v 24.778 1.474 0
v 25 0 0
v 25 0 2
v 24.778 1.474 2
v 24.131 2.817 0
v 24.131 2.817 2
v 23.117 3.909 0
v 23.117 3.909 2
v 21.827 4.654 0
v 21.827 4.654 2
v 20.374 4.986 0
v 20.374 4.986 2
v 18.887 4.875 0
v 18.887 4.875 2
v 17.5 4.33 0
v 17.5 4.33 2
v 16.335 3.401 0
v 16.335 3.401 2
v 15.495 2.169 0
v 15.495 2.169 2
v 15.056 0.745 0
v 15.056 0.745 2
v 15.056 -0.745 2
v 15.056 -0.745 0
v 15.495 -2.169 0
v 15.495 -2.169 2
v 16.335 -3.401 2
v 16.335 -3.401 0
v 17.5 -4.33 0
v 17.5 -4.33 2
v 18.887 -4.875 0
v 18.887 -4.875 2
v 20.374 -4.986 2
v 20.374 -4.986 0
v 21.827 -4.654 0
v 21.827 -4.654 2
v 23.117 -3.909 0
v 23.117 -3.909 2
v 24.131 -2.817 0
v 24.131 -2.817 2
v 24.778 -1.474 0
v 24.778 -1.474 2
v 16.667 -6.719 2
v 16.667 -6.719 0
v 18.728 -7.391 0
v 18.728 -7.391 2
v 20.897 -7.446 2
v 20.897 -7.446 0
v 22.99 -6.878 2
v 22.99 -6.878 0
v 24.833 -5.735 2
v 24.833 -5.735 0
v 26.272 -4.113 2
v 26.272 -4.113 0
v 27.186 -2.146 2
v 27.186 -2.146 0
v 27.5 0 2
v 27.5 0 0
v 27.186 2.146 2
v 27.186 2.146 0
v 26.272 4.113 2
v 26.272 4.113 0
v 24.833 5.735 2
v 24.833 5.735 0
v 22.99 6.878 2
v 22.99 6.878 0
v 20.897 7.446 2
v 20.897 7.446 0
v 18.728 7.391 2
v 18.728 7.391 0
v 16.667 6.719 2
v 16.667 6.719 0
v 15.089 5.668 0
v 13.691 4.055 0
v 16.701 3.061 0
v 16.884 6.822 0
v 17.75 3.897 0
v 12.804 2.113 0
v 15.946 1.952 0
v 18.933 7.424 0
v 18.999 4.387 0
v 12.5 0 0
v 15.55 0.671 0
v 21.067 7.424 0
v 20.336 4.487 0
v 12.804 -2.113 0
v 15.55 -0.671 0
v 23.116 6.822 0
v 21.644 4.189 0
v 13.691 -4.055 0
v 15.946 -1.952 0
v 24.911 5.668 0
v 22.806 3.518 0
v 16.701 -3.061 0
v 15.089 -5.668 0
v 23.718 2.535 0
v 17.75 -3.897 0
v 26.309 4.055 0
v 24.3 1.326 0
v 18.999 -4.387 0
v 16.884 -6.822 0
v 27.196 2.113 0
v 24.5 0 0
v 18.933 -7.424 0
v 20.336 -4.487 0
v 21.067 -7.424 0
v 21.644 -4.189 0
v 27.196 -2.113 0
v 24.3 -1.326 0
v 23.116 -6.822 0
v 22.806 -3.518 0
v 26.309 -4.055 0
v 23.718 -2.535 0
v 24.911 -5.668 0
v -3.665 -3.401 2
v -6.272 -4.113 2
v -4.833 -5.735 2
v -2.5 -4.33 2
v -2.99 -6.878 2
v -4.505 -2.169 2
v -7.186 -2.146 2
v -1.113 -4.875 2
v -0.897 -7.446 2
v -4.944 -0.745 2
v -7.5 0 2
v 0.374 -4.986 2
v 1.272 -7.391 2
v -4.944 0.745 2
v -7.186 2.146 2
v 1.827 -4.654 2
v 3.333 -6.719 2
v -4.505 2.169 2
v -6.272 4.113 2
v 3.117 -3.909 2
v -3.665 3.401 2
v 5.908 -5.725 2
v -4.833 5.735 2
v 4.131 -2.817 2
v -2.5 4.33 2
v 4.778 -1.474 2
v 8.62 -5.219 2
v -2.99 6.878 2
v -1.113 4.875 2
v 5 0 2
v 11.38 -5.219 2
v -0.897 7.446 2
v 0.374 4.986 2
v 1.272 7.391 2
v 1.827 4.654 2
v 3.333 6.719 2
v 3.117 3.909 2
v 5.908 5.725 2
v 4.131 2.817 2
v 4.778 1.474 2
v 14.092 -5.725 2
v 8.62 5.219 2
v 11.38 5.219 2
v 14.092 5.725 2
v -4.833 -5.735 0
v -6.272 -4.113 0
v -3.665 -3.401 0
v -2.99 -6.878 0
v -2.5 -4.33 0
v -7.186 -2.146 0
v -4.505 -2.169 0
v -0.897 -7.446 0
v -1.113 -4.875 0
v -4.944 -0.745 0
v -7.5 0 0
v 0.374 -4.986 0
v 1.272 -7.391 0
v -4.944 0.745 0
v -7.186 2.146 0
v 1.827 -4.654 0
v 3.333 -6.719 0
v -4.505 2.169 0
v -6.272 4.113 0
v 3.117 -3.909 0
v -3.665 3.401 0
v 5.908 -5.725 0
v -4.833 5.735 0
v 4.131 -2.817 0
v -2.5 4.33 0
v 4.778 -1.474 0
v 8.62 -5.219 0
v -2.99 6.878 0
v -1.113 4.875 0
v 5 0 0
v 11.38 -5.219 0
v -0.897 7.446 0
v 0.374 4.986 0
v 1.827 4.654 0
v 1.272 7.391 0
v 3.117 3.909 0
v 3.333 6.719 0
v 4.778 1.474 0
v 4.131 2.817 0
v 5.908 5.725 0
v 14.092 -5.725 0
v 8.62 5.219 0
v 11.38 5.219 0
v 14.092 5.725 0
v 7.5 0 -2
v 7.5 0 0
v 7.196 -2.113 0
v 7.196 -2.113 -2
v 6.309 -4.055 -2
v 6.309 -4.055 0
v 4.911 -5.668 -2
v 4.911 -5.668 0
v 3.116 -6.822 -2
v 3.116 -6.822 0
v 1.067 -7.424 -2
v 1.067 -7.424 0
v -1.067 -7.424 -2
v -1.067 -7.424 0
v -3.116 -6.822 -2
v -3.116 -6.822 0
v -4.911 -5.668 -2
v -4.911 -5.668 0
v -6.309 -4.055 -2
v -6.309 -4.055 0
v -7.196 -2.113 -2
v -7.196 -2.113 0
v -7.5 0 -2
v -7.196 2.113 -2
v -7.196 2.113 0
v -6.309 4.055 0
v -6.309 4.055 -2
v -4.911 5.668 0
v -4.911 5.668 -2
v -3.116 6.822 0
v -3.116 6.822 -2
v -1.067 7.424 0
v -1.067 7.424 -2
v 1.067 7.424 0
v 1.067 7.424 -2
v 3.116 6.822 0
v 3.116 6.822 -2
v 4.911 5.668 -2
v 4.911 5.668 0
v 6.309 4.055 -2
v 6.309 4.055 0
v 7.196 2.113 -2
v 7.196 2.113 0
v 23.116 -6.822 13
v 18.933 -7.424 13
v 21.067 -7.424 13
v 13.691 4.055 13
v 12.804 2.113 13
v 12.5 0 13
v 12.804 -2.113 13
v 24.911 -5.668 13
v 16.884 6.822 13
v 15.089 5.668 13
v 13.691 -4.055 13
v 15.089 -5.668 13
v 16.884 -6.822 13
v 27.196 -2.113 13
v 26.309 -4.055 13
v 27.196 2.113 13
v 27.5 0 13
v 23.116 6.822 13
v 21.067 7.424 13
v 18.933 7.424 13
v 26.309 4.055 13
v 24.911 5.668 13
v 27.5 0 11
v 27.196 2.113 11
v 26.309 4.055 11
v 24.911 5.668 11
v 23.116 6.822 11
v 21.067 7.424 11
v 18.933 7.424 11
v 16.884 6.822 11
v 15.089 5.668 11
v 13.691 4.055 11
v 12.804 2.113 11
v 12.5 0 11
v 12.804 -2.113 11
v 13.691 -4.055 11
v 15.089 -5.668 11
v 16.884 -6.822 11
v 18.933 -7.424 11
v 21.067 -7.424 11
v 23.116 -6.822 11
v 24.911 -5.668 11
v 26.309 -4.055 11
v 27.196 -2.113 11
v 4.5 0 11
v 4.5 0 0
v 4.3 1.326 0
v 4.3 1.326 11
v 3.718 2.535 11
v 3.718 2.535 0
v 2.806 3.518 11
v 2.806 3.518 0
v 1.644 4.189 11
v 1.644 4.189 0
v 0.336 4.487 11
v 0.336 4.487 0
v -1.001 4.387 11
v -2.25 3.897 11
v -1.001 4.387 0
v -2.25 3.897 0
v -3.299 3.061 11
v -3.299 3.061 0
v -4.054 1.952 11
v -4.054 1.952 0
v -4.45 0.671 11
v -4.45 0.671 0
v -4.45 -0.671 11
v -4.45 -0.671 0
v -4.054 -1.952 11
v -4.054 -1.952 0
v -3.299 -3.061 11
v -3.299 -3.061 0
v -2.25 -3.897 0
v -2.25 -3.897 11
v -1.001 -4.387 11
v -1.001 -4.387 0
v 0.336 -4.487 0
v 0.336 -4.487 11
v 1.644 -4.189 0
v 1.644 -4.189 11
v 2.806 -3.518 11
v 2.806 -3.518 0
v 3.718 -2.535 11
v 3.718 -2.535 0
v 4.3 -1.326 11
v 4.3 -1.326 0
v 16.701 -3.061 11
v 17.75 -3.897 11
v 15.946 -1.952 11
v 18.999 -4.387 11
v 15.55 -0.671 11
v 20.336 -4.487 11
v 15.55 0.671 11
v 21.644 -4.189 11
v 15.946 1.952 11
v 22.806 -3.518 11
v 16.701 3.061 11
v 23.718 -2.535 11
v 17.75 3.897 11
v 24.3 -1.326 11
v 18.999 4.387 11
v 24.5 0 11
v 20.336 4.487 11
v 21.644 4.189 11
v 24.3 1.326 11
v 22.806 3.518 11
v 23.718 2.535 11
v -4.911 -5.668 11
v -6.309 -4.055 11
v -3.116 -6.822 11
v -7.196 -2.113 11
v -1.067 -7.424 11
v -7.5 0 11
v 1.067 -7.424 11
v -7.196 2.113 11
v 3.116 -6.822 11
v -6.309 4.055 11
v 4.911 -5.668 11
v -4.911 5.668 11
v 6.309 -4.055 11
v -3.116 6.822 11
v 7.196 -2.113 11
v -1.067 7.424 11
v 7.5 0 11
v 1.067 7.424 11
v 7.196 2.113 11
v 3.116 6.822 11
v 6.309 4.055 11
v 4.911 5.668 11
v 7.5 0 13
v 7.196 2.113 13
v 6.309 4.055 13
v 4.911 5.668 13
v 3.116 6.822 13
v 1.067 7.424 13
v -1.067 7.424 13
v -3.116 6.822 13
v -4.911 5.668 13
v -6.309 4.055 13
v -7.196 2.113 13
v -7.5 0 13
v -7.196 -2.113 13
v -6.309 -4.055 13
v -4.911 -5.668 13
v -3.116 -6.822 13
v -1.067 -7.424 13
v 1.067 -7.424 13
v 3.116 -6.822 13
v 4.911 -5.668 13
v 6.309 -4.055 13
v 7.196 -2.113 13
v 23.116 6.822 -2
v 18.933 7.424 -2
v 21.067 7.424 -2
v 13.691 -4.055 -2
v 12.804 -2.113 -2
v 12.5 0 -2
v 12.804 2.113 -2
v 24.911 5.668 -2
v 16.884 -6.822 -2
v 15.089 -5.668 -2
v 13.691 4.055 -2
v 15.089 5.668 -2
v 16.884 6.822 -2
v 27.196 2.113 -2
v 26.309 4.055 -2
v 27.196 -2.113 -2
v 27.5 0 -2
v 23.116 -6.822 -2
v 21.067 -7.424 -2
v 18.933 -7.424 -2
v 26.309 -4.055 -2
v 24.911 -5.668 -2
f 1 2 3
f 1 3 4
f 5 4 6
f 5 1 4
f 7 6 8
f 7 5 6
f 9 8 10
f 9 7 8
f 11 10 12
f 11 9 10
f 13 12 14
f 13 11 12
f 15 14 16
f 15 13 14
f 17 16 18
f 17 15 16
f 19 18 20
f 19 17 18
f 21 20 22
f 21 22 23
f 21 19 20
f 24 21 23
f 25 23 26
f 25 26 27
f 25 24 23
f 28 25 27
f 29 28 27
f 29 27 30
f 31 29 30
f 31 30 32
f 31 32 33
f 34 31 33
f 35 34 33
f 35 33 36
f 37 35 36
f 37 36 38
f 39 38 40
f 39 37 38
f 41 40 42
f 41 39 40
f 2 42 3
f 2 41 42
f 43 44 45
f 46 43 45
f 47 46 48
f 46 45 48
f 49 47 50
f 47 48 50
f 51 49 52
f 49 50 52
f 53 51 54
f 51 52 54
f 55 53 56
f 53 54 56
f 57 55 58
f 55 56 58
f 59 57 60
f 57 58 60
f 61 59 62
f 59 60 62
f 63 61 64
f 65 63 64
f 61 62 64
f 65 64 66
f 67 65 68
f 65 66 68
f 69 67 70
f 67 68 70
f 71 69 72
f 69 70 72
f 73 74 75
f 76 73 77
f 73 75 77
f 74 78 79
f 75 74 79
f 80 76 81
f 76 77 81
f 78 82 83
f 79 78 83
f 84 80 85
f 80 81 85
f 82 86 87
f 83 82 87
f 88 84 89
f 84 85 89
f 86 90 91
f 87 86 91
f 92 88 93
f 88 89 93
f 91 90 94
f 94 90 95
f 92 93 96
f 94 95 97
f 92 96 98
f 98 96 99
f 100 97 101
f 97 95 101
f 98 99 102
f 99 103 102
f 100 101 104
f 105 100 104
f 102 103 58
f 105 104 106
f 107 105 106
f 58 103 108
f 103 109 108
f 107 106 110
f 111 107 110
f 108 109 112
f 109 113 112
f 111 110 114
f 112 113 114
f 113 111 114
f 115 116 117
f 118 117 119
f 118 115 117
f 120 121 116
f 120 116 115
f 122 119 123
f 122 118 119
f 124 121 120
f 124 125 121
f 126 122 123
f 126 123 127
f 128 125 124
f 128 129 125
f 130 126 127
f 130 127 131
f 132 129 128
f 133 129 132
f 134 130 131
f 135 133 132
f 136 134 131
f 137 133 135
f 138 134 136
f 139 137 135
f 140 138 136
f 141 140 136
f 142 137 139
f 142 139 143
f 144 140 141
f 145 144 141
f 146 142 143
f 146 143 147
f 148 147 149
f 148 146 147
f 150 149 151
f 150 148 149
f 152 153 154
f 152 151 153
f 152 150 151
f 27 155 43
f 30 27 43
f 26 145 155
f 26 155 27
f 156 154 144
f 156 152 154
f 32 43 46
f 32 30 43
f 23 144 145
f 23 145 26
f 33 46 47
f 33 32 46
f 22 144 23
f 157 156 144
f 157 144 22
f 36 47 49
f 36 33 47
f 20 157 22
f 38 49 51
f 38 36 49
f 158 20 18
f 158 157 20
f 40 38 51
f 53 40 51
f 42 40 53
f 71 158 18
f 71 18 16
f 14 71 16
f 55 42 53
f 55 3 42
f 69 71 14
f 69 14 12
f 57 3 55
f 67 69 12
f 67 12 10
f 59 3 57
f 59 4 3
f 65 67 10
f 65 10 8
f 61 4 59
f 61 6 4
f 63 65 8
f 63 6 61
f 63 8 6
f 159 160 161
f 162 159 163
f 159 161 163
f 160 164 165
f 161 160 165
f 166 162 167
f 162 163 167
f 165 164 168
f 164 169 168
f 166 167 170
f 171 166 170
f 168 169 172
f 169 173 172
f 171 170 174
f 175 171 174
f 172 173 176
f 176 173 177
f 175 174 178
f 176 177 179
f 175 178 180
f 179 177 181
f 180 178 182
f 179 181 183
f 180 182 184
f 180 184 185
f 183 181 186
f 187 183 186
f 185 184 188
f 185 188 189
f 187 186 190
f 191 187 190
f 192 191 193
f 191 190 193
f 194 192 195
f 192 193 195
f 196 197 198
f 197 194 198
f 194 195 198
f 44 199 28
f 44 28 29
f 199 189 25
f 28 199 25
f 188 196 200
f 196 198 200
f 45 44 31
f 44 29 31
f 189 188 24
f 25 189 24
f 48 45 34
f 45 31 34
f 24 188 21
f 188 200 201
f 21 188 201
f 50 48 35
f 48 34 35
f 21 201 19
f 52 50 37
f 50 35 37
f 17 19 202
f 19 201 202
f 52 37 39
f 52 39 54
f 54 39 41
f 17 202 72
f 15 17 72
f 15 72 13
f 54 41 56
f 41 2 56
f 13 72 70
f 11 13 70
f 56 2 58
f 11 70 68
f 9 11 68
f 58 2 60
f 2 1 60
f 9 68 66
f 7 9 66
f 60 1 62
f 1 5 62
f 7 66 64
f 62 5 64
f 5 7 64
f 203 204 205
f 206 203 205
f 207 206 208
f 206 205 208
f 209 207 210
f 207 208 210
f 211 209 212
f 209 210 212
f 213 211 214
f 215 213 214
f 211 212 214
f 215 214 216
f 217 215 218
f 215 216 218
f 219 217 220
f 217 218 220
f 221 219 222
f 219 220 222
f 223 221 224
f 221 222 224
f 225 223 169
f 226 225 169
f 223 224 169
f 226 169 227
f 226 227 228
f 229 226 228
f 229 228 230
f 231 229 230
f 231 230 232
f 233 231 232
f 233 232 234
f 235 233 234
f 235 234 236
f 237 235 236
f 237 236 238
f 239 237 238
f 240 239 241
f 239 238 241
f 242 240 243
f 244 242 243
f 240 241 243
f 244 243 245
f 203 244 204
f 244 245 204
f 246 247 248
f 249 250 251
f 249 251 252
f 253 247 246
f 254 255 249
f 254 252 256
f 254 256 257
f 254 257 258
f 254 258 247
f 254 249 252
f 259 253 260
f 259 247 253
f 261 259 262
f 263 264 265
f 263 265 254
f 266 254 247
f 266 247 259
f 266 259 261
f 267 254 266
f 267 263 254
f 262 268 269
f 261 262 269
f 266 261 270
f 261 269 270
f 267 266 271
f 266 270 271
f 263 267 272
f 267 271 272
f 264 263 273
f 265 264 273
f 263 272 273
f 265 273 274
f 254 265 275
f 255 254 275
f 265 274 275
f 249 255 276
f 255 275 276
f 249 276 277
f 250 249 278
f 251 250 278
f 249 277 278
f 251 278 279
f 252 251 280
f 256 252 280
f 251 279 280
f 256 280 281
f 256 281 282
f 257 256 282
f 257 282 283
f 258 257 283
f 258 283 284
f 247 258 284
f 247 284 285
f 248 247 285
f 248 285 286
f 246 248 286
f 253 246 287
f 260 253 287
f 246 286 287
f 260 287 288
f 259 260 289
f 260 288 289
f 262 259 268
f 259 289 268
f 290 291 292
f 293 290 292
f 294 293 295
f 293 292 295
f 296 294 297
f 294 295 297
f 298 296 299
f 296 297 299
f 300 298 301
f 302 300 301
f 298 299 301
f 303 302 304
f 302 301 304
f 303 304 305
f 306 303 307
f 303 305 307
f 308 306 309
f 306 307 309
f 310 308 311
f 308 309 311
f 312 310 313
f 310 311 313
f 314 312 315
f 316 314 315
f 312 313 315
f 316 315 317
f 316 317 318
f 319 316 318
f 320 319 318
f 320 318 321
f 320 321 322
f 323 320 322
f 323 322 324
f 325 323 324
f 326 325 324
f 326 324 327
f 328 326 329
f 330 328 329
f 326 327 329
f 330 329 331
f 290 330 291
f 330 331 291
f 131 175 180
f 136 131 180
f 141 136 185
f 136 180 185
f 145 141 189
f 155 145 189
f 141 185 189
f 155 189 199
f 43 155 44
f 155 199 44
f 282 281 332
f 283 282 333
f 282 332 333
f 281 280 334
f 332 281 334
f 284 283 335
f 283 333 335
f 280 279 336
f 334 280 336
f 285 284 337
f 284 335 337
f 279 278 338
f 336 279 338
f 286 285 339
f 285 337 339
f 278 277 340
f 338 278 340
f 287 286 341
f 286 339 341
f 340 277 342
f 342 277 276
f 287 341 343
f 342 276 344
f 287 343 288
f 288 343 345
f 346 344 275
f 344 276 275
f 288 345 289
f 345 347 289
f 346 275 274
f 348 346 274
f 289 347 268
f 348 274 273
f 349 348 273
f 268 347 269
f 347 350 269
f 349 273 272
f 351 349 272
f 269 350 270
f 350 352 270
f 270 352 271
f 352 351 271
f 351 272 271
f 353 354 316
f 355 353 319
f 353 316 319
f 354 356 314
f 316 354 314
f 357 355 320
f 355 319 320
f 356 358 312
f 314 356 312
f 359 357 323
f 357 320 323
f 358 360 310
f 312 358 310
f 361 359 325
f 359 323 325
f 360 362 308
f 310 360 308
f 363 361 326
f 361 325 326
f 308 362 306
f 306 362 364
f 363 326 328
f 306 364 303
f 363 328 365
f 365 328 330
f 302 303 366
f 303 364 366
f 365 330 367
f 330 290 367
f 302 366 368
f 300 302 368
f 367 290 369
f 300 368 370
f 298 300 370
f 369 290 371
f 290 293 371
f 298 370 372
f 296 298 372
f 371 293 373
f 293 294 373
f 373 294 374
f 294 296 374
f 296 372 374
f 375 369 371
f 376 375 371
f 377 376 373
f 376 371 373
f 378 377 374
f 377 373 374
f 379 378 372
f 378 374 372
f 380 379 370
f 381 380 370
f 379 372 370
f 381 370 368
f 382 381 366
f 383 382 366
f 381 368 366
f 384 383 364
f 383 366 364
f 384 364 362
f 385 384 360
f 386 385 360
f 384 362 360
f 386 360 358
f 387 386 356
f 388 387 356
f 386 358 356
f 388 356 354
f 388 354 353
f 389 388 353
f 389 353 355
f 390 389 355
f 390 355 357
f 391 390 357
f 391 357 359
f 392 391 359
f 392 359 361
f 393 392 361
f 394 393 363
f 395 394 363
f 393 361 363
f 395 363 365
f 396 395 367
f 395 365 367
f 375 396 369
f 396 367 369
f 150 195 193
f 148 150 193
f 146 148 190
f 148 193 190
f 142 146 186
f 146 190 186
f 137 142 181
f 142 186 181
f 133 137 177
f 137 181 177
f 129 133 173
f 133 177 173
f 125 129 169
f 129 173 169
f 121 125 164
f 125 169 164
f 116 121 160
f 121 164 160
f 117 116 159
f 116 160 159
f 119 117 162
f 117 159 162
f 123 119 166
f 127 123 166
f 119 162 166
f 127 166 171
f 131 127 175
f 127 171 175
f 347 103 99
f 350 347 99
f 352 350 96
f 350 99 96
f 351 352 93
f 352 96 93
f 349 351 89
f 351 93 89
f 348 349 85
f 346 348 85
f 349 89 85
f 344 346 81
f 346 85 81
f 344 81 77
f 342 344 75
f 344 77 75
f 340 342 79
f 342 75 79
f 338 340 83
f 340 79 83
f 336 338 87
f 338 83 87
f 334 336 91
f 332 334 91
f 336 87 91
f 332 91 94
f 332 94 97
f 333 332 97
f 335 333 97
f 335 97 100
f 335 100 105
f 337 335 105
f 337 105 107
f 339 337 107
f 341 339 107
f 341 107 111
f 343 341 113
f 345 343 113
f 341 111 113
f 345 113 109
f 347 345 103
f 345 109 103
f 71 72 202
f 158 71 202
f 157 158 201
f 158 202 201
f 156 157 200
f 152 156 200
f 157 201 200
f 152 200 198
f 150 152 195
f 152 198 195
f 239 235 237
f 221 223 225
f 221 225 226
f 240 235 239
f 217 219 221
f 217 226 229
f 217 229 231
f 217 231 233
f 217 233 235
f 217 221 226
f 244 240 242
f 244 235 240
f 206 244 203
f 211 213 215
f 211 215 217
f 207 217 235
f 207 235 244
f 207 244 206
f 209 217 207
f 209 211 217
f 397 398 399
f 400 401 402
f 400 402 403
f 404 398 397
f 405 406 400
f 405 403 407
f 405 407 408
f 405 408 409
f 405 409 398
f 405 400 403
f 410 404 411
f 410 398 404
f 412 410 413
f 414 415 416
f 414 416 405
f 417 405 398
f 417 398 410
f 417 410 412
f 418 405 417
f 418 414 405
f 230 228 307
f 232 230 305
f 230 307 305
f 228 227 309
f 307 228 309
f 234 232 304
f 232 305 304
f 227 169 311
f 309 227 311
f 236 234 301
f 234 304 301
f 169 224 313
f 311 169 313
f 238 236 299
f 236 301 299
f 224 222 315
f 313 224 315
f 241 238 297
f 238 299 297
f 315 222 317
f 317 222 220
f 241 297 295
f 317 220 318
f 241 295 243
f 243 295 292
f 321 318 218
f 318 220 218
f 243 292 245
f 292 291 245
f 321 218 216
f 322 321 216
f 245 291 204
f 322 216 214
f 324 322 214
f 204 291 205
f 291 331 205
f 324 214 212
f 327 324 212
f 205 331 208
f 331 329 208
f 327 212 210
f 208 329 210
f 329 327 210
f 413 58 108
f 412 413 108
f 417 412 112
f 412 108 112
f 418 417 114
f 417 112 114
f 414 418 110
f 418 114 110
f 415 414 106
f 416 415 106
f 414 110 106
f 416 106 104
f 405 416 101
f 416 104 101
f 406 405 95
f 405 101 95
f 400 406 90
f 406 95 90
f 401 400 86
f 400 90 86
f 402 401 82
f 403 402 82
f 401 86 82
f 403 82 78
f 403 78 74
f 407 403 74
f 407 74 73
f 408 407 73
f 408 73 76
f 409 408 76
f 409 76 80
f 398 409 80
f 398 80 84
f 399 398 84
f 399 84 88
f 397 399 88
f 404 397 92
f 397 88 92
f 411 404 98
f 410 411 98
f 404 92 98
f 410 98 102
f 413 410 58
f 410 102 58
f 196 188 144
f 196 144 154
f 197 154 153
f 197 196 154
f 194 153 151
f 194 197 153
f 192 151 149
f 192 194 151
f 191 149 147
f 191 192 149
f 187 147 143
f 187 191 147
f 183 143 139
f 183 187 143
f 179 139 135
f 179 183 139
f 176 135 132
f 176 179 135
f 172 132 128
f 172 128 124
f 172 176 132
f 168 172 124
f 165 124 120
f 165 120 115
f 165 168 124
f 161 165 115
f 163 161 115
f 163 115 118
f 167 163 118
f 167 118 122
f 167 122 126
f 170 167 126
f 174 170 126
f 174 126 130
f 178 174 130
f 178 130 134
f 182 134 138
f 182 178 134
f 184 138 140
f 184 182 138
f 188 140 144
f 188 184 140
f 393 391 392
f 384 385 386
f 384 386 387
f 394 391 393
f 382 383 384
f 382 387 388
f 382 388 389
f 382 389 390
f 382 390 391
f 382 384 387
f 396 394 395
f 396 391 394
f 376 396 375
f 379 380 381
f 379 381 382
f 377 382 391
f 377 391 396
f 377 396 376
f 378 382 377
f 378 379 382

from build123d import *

# Parameters (mm, degrees)
F0_R     = 5
F1_DEPTH = 2
F2_R     = 4.5
F3_DEPTH = 11
F4_R     = 7.5
F5_DEPTH = 2
F6_R     = 7.5
F7_DEPTH = 2


with BuildPart() as f1:
    # F0 (on Top) → F1 (new body)
    with BuildSketch(Plane.XY):
        with BuildLine():
            ThreePointArc((16.6666666667, 6.7185481236), (10, 5.1556443707), (3.3333333333, 6.7185481236))
            ThreePointArc((3.3333333333, 6.7185481236), (-7.5, 0), (3.3333333333, -6.7185481236))
            ThreePointArc((3.3333333333, -6.7185481236), (10, -5.1556443707), (16.6666666667, -6.7185481236))
            ThreePointArc((16.6666666667, -6.7185481236), (27.5, 0), (16.6666666667, 6.7185481236))
        make_face()
        Circle(F0_R, mode=Mode.SUBTRACT)
        with Locations((20, 0)):
            Circle(F0_R, mode=Mode.SUBTRACT)
    extrude(amount=F1_DEPTH)


with BuildPart() as f3:
    # F2 (on Top) → F3 (new body)
    with BuildSketch(Plane.XY):
        Circle(F2_R)
    extrude(amount=F3_DEPTH)

    # F4 (on face) → F5 (join)
    with BuildSketch(Plane.XY.offset(11)):
        Circle(F4_R)
    extrude(amount=F5_DEPTH)

    # F6 (on face) → F7 (join)
    with BuildSketch(Plane(origin=(0, 0, 0), x_dir=(1, 0, 0), z_dir=(0, 0, -1))):
        Circle(F6_R)
    extrude(amount=F7_DEPTH)


with BuildPart() as f3b:
    # F2 (on Top) → F3, piece 2 (new body)
    with BuildSketch(Plane.XY):
        with Locations((20, 0)):
            Circle(F2_R)
    extrude(amount=F3_DEPTH)

    # F4 (on face) → F5, piece 2 (join)
    with BuildSketch(Plane.XY.offset(11)):
        with Locations((20, 0)):
            Circle(F4_R)
    extrude(amount=F5_DEPTH)

    # F6 (on face) → F7, piece 2 (join)
    with BuildSketch(Plane(origin=(0, 0, 0), x_dir=(1, 0, 0), z_dir=(0, 0, -1))):
        with Locations((20, 0)):
            Circle(F6_R)
    extrude(amount=F7_DEPTH)


solid = Compound([f1.part, f3.part, f3b.part])
